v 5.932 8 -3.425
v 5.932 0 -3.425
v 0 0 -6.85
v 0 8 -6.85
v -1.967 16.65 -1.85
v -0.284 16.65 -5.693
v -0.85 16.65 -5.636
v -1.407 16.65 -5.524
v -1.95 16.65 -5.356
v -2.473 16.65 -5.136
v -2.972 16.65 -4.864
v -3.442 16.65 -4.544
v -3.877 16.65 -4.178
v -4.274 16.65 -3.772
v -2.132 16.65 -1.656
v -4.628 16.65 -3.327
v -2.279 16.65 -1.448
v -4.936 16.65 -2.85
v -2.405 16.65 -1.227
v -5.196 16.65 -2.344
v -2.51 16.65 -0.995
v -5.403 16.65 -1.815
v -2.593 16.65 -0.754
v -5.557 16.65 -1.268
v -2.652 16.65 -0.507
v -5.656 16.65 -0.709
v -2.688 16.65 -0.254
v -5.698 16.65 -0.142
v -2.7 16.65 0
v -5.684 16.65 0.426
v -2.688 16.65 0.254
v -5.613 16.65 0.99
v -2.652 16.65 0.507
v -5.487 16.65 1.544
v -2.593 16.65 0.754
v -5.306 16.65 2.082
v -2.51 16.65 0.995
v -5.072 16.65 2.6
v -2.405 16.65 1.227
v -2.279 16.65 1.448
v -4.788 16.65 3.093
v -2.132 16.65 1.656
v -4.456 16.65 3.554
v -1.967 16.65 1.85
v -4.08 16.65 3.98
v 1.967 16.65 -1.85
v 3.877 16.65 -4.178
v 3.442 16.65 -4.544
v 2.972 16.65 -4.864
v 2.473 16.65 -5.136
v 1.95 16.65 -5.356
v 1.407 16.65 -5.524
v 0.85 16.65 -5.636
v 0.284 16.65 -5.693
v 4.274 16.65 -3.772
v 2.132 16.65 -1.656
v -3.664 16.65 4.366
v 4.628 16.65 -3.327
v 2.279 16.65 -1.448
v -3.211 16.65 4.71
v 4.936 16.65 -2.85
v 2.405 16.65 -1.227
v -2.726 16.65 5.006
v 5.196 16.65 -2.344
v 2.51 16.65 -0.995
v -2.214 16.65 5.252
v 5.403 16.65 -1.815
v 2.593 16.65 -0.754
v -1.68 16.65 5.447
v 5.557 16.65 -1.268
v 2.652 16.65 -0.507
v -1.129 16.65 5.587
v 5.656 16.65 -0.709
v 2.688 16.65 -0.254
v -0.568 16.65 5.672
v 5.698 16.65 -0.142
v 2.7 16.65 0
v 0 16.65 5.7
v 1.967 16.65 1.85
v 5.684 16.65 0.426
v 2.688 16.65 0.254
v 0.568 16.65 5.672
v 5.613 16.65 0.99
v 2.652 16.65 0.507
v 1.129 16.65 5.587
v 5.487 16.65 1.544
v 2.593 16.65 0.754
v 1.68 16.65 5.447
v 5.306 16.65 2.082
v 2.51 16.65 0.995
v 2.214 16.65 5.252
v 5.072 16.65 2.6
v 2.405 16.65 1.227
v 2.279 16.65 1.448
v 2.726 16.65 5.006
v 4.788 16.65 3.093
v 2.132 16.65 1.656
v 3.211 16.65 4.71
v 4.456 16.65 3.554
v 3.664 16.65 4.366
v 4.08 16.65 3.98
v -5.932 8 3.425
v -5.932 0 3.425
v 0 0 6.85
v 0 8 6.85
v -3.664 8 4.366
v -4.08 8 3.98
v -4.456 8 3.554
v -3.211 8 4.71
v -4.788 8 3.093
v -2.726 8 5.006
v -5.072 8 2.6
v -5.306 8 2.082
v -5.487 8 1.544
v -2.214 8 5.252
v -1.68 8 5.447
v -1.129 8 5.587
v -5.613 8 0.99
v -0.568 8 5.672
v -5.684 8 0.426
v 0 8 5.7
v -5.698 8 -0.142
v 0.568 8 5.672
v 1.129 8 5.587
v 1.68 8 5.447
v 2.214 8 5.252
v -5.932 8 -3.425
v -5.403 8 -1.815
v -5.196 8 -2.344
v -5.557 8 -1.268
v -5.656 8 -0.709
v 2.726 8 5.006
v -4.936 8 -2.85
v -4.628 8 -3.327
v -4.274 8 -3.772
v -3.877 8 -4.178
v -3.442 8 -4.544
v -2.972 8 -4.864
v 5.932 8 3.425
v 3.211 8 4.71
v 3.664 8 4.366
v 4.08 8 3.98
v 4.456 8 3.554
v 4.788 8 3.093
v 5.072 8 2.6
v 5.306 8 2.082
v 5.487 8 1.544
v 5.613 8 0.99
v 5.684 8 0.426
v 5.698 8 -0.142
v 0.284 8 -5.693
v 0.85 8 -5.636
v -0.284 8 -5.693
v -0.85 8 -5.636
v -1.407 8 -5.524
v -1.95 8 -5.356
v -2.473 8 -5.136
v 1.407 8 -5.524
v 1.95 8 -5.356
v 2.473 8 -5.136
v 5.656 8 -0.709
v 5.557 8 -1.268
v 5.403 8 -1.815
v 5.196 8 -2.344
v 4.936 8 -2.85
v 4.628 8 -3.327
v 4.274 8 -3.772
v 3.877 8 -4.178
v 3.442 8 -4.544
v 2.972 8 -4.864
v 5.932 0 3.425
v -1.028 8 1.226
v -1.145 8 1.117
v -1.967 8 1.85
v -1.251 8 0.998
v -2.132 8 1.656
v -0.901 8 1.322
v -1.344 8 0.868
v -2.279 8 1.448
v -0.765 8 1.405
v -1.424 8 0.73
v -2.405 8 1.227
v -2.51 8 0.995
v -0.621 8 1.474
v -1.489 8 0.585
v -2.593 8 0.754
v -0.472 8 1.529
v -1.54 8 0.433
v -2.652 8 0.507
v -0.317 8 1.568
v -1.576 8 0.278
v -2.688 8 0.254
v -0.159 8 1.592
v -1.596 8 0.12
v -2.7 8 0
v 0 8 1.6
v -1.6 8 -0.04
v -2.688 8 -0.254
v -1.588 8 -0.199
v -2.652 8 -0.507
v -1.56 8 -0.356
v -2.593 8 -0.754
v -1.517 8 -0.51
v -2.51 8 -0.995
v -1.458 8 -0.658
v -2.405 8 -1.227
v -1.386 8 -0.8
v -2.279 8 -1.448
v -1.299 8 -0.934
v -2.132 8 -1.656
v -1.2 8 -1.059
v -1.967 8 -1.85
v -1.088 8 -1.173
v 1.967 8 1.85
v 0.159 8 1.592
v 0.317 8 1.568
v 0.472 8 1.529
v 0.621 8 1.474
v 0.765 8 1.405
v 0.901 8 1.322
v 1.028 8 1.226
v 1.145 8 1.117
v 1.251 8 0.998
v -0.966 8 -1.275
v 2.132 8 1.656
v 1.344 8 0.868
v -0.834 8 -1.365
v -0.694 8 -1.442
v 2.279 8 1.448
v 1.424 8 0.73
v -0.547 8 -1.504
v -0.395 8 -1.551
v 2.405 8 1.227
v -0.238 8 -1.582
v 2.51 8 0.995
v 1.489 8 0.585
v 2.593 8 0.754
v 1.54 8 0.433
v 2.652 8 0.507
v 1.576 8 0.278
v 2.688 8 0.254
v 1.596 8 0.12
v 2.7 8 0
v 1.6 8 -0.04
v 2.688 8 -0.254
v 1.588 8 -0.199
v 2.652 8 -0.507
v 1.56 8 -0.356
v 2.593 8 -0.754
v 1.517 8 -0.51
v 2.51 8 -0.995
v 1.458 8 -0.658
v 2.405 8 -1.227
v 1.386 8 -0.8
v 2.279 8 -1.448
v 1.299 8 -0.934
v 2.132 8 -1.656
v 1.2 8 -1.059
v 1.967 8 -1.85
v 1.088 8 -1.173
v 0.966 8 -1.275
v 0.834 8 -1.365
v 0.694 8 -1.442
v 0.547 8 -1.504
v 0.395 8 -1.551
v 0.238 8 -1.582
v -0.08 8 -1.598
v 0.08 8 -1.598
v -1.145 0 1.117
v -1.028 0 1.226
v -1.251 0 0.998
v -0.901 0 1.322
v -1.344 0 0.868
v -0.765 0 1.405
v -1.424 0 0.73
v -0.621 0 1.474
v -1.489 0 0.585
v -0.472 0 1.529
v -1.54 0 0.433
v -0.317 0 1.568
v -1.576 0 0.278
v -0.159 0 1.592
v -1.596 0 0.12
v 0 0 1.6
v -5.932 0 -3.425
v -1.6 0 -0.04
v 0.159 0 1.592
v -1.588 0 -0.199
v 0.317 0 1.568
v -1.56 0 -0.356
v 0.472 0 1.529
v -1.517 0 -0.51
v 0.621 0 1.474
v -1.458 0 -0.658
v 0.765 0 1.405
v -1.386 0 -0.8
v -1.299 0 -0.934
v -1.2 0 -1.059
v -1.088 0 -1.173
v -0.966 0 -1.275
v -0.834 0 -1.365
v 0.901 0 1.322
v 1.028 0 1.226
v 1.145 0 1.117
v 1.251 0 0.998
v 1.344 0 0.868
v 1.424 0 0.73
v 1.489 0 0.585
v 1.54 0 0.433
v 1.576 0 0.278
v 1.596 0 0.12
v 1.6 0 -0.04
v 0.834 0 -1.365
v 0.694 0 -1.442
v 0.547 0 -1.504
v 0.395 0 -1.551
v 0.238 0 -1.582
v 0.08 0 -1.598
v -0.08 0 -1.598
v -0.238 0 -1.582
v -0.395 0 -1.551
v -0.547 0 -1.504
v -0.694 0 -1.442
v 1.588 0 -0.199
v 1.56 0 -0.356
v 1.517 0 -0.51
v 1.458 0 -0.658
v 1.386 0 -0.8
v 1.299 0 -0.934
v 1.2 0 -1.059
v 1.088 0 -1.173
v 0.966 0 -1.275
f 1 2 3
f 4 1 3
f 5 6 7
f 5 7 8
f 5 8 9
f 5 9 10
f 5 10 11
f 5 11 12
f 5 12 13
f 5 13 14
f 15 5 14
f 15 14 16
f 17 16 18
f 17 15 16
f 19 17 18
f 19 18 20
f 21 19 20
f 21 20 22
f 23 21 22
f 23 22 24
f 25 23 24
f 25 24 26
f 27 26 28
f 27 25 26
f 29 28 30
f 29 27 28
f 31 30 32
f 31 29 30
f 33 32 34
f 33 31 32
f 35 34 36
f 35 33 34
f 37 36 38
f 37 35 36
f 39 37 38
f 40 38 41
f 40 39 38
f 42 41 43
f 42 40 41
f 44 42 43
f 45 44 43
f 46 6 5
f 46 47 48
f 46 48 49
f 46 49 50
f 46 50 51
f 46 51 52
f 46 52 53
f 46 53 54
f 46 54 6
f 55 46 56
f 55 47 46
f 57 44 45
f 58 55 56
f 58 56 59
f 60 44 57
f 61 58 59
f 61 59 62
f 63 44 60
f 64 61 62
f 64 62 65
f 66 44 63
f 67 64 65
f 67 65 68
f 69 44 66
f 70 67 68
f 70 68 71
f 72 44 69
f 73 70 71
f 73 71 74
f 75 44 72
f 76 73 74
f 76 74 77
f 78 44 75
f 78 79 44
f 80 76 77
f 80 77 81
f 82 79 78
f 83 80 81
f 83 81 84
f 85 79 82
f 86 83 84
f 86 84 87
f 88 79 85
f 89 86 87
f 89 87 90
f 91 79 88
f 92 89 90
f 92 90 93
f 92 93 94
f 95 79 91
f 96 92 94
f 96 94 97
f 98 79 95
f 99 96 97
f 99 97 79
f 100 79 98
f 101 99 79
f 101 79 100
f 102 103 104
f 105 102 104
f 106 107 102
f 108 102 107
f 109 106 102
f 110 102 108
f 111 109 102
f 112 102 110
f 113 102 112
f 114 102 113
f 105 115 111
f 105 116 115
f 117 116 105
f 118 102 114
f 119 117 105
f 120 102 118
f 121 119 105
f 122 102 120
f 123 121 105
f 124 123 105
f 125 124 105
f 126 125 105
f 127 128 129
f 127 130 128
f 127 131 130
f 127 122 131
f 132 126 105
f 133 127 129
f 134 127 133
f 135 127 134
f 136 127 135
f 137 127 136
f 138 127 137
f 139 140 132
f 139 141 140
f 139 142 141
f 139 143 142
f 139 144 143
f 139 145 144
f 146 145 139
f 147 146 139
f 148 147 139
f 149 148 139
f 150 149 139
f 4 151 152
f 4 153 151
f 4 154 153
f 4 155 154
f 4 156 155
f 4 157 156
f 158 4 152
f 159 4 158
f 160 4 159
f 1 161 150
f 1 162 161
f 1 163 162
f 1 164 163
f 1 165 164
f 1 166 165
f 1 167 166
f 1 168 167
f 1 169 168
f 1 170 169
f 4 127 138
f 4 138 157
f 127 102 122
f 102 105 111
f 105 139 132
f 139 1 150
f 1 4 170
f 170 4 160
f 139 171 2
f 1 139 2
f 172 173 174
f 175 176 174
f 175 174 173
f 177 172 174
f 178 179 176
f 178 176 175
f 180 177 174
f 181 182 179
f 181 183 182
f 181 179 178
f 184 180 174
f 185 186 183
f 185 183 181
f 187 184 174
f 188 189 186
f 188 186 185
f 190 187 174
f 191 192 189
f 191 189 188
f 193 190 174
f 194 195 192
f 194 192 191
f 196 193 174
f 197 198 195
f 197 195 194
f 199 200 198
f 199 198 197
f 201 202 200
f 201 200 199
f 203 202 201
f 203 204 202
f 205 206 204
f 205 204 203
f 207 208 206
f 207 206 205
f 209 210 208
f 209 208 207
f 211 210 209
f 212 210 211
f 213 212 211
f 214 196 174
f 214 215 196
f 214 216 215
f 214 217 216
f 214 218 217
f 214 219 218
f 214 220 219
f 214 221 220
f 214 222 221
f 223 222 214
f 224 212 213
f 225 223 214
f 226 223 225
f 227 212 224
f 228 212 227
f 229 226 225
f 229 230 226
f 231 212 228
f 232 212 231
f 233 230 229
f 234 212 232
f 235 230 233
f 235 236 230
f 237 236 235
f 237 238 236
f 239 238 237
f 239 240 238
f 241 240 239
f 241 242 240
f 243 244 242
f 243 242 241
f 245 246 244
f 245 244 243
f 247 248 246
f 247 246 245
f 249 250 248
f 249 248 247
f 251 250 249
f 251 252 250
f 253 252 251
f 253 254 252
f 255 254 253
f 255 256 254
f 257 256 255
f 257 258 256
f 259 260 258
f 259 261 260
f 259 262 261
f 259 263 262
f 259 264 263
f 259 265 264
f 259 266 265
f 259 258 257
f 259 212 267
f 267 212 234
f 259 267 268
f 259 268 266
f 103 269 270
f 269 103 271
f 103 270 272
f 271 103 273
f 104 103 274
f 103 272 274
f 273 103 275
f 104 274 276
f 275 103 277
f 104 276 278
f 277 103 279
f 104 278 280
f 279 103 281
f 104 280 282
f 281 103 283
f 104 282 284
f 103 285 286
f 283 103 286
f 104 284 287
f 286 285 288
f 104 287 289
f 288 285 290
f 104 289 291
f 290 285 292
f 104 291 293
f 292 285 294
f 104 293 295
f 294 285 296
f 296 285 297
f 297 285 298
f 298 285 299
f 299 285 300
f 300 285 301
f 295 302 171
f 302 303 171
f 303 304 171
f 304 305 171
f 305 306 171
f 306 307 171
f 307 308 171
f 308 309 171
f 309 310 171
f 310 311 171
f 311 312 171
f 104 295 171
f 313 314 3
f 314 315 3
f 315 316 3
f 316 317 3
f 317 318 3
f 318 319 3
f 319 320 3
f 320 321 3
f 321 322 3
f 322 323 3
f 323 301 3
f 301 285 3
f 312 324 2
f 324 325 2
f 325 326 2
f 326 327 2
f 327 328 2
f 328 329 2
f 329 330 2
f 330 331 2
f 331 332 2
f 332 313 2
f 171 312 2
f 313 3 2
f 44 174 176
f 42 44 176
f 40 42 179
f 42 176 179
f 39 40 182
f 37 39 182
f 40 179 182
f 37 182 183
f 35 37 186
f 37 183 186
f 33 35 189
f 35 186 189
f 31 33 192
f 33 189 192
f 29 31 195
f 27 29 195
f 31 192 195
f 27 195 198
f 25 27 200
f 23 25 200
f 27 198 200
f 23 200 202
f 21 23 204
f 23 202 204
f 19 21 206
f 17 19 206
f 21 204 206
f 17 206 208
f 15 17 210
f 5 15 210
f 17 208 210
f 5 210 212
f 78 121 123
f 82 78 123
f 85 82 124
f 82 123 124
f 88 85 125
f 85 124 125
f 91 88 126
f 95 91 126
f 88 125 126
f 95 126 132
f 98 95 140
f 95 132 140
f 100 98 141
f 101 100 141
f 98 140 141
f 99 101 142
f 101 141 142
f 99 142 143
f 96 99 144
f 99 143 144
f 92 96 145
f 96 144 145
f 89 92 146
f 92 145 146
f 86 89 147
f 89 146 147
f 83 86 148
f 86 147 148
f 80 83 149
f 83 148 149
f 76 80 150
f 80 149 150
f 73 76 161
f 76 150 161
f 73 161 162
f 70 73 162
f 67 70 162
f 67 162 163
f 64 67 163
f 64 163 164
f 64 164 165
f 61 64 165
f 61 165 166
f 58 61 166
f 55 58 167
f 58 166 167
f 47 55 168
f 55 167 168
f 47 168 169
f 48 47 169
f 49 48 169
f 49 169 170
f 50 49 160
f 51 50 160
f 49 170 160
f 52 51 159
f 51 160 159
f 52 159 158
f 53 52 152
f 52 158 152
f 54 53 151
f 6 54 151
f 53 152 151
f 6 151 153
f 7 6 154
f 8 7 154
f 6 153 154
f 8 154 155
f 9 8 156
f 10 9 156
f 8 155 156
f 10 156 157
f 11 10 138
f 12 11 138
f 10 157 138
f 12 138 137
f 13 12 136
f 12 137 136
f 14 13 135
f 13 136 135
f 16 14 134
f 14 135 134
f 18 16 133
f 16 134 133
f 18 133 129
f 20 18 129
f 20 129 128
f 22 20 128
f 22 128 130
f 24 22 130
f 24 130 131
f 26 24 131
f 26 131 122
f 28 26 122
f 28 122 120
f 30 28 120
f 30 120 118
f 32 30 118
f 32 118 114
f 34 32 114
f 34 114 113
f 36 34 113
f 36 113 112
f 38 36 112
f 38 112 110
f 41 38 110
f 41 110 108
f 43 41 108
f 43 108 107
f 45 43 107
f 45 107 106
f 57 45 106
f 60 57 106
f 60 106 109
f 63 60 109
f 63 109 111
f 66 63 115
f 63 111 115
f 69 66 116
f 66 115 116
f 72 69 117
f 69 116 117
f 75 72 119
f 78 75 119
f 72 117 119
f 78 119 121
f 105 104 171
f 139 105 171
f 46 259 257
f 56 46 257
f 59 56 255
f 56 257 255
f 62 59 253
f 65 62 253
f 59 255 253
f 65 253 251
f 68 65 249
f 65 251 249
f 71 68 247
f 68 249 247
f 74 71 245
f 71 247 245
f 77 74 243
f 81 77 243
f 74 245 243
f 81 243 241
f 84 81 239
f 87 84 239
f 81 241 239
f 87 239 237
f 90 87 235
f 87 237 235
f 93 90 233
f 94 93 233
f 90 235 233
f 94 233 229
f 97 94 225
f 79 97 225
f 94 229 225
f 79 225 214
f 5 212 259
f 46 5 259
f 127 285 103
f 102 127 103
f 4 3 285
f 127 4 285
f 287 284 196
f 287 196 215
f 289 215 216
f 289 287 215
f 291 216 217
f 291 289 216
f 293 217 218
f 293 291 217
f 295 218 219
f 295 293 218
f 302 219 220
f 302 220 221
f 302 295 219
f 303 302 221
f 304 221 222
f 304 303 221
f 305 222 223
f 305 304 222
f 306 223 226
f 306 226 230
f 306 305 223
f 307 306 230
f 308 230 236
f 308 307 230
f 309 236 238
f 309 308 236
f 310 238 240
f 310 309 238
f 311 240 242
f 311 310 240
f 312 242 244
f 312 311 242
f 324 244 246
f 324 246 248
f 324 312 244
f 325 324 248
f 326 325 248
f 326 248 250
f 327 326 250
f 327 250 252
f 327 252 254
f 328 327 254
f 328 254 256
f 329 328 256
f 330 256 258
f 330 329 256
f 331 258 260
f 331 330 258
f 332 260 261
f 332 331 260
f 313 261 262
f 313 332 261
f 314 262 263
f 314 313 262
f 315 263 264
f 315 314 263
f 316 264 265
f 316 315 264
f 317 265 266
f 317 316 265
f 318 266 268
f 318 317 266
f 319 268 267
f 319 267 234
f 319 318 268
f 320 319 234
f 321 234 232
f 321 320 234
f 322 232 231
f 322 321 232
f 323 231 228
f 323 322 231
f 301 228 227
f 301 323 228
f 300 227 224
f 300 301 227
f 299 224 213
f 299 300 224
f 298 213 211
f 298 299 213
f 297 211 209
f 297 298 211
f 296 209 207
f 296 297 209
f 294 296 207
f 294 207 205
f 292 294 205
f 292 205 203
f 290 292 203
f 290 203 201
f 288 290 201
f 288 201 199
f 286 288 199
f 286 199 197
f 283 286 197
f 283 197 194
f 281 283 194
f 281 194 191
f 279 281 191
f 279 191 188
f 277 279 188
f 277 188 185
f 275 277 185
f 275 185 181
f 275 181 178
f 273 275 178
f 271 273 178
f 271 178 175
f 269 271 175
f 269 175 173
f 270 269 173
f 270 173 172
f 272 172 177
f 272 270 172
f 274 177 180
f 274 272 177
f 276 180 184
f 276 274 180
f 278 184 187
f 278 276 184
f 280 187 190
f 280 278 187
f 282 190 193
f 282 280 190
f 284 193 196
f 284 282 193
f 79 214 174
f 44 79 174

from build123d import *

# Parameters (mm, degrees)
SKETCH_1_R      = 1.6
EXTRUDE_1_DEPTH = 8
SKETCH_2_R      = 5.7
EXTRUDE_2_DEPTH = 8.65


with BuildPart() as part:
    # 草图1 → 凸台-拉伸1 (new body)
    with BuildSketch(Plane(origin=(0, 0, 0), x_dir=(1, 0, 0), z_dir=(0, 1, 0))):
        Polygon((0, 6.85), (-5.932274016, 3.425), (-5.932274016, -3.425), (0, -6.85), (5.932274016, -3.425), (5.932274016, 3.425), align=None)
        with Locations(Location((0, 0, 0), (0, 0, 270))):
            Circle(SKETCH_1_R, mode=Mode.SUBTRACT)
    extrude(amount=EXTRUDE_1_DEPTH)

    # 草图2 → 凸台-拉伸2 (add)
    with BuildSketch(Plane(origin=(0, 8, 0), x_dir=(1, 0, 0), z_dir=(0, 1, 0))):
        with Locations(Location((0, 0, 0), (0, 0, 270))):
            Circle(SKETCH_2_R)
        with BuildLine():
            Line((-1.966596044, 1.85), (1.966596044, 1.85))
            ThreePointArc((1.966596044, 1.85), (2.7, 0), (1.966596044, -1.85))
            Line((1.966596044, -1.85), (-1.966596044, -1.85))
            ThreePointArc((-1.966596044, -1.85), (-2.7, 0), (-1.966596044, 1.85))
        make_face(mode=Mode.SUBTRACT)
    extrude(amount=EXTRUDE_2_DEPTH)


solid = part.part
